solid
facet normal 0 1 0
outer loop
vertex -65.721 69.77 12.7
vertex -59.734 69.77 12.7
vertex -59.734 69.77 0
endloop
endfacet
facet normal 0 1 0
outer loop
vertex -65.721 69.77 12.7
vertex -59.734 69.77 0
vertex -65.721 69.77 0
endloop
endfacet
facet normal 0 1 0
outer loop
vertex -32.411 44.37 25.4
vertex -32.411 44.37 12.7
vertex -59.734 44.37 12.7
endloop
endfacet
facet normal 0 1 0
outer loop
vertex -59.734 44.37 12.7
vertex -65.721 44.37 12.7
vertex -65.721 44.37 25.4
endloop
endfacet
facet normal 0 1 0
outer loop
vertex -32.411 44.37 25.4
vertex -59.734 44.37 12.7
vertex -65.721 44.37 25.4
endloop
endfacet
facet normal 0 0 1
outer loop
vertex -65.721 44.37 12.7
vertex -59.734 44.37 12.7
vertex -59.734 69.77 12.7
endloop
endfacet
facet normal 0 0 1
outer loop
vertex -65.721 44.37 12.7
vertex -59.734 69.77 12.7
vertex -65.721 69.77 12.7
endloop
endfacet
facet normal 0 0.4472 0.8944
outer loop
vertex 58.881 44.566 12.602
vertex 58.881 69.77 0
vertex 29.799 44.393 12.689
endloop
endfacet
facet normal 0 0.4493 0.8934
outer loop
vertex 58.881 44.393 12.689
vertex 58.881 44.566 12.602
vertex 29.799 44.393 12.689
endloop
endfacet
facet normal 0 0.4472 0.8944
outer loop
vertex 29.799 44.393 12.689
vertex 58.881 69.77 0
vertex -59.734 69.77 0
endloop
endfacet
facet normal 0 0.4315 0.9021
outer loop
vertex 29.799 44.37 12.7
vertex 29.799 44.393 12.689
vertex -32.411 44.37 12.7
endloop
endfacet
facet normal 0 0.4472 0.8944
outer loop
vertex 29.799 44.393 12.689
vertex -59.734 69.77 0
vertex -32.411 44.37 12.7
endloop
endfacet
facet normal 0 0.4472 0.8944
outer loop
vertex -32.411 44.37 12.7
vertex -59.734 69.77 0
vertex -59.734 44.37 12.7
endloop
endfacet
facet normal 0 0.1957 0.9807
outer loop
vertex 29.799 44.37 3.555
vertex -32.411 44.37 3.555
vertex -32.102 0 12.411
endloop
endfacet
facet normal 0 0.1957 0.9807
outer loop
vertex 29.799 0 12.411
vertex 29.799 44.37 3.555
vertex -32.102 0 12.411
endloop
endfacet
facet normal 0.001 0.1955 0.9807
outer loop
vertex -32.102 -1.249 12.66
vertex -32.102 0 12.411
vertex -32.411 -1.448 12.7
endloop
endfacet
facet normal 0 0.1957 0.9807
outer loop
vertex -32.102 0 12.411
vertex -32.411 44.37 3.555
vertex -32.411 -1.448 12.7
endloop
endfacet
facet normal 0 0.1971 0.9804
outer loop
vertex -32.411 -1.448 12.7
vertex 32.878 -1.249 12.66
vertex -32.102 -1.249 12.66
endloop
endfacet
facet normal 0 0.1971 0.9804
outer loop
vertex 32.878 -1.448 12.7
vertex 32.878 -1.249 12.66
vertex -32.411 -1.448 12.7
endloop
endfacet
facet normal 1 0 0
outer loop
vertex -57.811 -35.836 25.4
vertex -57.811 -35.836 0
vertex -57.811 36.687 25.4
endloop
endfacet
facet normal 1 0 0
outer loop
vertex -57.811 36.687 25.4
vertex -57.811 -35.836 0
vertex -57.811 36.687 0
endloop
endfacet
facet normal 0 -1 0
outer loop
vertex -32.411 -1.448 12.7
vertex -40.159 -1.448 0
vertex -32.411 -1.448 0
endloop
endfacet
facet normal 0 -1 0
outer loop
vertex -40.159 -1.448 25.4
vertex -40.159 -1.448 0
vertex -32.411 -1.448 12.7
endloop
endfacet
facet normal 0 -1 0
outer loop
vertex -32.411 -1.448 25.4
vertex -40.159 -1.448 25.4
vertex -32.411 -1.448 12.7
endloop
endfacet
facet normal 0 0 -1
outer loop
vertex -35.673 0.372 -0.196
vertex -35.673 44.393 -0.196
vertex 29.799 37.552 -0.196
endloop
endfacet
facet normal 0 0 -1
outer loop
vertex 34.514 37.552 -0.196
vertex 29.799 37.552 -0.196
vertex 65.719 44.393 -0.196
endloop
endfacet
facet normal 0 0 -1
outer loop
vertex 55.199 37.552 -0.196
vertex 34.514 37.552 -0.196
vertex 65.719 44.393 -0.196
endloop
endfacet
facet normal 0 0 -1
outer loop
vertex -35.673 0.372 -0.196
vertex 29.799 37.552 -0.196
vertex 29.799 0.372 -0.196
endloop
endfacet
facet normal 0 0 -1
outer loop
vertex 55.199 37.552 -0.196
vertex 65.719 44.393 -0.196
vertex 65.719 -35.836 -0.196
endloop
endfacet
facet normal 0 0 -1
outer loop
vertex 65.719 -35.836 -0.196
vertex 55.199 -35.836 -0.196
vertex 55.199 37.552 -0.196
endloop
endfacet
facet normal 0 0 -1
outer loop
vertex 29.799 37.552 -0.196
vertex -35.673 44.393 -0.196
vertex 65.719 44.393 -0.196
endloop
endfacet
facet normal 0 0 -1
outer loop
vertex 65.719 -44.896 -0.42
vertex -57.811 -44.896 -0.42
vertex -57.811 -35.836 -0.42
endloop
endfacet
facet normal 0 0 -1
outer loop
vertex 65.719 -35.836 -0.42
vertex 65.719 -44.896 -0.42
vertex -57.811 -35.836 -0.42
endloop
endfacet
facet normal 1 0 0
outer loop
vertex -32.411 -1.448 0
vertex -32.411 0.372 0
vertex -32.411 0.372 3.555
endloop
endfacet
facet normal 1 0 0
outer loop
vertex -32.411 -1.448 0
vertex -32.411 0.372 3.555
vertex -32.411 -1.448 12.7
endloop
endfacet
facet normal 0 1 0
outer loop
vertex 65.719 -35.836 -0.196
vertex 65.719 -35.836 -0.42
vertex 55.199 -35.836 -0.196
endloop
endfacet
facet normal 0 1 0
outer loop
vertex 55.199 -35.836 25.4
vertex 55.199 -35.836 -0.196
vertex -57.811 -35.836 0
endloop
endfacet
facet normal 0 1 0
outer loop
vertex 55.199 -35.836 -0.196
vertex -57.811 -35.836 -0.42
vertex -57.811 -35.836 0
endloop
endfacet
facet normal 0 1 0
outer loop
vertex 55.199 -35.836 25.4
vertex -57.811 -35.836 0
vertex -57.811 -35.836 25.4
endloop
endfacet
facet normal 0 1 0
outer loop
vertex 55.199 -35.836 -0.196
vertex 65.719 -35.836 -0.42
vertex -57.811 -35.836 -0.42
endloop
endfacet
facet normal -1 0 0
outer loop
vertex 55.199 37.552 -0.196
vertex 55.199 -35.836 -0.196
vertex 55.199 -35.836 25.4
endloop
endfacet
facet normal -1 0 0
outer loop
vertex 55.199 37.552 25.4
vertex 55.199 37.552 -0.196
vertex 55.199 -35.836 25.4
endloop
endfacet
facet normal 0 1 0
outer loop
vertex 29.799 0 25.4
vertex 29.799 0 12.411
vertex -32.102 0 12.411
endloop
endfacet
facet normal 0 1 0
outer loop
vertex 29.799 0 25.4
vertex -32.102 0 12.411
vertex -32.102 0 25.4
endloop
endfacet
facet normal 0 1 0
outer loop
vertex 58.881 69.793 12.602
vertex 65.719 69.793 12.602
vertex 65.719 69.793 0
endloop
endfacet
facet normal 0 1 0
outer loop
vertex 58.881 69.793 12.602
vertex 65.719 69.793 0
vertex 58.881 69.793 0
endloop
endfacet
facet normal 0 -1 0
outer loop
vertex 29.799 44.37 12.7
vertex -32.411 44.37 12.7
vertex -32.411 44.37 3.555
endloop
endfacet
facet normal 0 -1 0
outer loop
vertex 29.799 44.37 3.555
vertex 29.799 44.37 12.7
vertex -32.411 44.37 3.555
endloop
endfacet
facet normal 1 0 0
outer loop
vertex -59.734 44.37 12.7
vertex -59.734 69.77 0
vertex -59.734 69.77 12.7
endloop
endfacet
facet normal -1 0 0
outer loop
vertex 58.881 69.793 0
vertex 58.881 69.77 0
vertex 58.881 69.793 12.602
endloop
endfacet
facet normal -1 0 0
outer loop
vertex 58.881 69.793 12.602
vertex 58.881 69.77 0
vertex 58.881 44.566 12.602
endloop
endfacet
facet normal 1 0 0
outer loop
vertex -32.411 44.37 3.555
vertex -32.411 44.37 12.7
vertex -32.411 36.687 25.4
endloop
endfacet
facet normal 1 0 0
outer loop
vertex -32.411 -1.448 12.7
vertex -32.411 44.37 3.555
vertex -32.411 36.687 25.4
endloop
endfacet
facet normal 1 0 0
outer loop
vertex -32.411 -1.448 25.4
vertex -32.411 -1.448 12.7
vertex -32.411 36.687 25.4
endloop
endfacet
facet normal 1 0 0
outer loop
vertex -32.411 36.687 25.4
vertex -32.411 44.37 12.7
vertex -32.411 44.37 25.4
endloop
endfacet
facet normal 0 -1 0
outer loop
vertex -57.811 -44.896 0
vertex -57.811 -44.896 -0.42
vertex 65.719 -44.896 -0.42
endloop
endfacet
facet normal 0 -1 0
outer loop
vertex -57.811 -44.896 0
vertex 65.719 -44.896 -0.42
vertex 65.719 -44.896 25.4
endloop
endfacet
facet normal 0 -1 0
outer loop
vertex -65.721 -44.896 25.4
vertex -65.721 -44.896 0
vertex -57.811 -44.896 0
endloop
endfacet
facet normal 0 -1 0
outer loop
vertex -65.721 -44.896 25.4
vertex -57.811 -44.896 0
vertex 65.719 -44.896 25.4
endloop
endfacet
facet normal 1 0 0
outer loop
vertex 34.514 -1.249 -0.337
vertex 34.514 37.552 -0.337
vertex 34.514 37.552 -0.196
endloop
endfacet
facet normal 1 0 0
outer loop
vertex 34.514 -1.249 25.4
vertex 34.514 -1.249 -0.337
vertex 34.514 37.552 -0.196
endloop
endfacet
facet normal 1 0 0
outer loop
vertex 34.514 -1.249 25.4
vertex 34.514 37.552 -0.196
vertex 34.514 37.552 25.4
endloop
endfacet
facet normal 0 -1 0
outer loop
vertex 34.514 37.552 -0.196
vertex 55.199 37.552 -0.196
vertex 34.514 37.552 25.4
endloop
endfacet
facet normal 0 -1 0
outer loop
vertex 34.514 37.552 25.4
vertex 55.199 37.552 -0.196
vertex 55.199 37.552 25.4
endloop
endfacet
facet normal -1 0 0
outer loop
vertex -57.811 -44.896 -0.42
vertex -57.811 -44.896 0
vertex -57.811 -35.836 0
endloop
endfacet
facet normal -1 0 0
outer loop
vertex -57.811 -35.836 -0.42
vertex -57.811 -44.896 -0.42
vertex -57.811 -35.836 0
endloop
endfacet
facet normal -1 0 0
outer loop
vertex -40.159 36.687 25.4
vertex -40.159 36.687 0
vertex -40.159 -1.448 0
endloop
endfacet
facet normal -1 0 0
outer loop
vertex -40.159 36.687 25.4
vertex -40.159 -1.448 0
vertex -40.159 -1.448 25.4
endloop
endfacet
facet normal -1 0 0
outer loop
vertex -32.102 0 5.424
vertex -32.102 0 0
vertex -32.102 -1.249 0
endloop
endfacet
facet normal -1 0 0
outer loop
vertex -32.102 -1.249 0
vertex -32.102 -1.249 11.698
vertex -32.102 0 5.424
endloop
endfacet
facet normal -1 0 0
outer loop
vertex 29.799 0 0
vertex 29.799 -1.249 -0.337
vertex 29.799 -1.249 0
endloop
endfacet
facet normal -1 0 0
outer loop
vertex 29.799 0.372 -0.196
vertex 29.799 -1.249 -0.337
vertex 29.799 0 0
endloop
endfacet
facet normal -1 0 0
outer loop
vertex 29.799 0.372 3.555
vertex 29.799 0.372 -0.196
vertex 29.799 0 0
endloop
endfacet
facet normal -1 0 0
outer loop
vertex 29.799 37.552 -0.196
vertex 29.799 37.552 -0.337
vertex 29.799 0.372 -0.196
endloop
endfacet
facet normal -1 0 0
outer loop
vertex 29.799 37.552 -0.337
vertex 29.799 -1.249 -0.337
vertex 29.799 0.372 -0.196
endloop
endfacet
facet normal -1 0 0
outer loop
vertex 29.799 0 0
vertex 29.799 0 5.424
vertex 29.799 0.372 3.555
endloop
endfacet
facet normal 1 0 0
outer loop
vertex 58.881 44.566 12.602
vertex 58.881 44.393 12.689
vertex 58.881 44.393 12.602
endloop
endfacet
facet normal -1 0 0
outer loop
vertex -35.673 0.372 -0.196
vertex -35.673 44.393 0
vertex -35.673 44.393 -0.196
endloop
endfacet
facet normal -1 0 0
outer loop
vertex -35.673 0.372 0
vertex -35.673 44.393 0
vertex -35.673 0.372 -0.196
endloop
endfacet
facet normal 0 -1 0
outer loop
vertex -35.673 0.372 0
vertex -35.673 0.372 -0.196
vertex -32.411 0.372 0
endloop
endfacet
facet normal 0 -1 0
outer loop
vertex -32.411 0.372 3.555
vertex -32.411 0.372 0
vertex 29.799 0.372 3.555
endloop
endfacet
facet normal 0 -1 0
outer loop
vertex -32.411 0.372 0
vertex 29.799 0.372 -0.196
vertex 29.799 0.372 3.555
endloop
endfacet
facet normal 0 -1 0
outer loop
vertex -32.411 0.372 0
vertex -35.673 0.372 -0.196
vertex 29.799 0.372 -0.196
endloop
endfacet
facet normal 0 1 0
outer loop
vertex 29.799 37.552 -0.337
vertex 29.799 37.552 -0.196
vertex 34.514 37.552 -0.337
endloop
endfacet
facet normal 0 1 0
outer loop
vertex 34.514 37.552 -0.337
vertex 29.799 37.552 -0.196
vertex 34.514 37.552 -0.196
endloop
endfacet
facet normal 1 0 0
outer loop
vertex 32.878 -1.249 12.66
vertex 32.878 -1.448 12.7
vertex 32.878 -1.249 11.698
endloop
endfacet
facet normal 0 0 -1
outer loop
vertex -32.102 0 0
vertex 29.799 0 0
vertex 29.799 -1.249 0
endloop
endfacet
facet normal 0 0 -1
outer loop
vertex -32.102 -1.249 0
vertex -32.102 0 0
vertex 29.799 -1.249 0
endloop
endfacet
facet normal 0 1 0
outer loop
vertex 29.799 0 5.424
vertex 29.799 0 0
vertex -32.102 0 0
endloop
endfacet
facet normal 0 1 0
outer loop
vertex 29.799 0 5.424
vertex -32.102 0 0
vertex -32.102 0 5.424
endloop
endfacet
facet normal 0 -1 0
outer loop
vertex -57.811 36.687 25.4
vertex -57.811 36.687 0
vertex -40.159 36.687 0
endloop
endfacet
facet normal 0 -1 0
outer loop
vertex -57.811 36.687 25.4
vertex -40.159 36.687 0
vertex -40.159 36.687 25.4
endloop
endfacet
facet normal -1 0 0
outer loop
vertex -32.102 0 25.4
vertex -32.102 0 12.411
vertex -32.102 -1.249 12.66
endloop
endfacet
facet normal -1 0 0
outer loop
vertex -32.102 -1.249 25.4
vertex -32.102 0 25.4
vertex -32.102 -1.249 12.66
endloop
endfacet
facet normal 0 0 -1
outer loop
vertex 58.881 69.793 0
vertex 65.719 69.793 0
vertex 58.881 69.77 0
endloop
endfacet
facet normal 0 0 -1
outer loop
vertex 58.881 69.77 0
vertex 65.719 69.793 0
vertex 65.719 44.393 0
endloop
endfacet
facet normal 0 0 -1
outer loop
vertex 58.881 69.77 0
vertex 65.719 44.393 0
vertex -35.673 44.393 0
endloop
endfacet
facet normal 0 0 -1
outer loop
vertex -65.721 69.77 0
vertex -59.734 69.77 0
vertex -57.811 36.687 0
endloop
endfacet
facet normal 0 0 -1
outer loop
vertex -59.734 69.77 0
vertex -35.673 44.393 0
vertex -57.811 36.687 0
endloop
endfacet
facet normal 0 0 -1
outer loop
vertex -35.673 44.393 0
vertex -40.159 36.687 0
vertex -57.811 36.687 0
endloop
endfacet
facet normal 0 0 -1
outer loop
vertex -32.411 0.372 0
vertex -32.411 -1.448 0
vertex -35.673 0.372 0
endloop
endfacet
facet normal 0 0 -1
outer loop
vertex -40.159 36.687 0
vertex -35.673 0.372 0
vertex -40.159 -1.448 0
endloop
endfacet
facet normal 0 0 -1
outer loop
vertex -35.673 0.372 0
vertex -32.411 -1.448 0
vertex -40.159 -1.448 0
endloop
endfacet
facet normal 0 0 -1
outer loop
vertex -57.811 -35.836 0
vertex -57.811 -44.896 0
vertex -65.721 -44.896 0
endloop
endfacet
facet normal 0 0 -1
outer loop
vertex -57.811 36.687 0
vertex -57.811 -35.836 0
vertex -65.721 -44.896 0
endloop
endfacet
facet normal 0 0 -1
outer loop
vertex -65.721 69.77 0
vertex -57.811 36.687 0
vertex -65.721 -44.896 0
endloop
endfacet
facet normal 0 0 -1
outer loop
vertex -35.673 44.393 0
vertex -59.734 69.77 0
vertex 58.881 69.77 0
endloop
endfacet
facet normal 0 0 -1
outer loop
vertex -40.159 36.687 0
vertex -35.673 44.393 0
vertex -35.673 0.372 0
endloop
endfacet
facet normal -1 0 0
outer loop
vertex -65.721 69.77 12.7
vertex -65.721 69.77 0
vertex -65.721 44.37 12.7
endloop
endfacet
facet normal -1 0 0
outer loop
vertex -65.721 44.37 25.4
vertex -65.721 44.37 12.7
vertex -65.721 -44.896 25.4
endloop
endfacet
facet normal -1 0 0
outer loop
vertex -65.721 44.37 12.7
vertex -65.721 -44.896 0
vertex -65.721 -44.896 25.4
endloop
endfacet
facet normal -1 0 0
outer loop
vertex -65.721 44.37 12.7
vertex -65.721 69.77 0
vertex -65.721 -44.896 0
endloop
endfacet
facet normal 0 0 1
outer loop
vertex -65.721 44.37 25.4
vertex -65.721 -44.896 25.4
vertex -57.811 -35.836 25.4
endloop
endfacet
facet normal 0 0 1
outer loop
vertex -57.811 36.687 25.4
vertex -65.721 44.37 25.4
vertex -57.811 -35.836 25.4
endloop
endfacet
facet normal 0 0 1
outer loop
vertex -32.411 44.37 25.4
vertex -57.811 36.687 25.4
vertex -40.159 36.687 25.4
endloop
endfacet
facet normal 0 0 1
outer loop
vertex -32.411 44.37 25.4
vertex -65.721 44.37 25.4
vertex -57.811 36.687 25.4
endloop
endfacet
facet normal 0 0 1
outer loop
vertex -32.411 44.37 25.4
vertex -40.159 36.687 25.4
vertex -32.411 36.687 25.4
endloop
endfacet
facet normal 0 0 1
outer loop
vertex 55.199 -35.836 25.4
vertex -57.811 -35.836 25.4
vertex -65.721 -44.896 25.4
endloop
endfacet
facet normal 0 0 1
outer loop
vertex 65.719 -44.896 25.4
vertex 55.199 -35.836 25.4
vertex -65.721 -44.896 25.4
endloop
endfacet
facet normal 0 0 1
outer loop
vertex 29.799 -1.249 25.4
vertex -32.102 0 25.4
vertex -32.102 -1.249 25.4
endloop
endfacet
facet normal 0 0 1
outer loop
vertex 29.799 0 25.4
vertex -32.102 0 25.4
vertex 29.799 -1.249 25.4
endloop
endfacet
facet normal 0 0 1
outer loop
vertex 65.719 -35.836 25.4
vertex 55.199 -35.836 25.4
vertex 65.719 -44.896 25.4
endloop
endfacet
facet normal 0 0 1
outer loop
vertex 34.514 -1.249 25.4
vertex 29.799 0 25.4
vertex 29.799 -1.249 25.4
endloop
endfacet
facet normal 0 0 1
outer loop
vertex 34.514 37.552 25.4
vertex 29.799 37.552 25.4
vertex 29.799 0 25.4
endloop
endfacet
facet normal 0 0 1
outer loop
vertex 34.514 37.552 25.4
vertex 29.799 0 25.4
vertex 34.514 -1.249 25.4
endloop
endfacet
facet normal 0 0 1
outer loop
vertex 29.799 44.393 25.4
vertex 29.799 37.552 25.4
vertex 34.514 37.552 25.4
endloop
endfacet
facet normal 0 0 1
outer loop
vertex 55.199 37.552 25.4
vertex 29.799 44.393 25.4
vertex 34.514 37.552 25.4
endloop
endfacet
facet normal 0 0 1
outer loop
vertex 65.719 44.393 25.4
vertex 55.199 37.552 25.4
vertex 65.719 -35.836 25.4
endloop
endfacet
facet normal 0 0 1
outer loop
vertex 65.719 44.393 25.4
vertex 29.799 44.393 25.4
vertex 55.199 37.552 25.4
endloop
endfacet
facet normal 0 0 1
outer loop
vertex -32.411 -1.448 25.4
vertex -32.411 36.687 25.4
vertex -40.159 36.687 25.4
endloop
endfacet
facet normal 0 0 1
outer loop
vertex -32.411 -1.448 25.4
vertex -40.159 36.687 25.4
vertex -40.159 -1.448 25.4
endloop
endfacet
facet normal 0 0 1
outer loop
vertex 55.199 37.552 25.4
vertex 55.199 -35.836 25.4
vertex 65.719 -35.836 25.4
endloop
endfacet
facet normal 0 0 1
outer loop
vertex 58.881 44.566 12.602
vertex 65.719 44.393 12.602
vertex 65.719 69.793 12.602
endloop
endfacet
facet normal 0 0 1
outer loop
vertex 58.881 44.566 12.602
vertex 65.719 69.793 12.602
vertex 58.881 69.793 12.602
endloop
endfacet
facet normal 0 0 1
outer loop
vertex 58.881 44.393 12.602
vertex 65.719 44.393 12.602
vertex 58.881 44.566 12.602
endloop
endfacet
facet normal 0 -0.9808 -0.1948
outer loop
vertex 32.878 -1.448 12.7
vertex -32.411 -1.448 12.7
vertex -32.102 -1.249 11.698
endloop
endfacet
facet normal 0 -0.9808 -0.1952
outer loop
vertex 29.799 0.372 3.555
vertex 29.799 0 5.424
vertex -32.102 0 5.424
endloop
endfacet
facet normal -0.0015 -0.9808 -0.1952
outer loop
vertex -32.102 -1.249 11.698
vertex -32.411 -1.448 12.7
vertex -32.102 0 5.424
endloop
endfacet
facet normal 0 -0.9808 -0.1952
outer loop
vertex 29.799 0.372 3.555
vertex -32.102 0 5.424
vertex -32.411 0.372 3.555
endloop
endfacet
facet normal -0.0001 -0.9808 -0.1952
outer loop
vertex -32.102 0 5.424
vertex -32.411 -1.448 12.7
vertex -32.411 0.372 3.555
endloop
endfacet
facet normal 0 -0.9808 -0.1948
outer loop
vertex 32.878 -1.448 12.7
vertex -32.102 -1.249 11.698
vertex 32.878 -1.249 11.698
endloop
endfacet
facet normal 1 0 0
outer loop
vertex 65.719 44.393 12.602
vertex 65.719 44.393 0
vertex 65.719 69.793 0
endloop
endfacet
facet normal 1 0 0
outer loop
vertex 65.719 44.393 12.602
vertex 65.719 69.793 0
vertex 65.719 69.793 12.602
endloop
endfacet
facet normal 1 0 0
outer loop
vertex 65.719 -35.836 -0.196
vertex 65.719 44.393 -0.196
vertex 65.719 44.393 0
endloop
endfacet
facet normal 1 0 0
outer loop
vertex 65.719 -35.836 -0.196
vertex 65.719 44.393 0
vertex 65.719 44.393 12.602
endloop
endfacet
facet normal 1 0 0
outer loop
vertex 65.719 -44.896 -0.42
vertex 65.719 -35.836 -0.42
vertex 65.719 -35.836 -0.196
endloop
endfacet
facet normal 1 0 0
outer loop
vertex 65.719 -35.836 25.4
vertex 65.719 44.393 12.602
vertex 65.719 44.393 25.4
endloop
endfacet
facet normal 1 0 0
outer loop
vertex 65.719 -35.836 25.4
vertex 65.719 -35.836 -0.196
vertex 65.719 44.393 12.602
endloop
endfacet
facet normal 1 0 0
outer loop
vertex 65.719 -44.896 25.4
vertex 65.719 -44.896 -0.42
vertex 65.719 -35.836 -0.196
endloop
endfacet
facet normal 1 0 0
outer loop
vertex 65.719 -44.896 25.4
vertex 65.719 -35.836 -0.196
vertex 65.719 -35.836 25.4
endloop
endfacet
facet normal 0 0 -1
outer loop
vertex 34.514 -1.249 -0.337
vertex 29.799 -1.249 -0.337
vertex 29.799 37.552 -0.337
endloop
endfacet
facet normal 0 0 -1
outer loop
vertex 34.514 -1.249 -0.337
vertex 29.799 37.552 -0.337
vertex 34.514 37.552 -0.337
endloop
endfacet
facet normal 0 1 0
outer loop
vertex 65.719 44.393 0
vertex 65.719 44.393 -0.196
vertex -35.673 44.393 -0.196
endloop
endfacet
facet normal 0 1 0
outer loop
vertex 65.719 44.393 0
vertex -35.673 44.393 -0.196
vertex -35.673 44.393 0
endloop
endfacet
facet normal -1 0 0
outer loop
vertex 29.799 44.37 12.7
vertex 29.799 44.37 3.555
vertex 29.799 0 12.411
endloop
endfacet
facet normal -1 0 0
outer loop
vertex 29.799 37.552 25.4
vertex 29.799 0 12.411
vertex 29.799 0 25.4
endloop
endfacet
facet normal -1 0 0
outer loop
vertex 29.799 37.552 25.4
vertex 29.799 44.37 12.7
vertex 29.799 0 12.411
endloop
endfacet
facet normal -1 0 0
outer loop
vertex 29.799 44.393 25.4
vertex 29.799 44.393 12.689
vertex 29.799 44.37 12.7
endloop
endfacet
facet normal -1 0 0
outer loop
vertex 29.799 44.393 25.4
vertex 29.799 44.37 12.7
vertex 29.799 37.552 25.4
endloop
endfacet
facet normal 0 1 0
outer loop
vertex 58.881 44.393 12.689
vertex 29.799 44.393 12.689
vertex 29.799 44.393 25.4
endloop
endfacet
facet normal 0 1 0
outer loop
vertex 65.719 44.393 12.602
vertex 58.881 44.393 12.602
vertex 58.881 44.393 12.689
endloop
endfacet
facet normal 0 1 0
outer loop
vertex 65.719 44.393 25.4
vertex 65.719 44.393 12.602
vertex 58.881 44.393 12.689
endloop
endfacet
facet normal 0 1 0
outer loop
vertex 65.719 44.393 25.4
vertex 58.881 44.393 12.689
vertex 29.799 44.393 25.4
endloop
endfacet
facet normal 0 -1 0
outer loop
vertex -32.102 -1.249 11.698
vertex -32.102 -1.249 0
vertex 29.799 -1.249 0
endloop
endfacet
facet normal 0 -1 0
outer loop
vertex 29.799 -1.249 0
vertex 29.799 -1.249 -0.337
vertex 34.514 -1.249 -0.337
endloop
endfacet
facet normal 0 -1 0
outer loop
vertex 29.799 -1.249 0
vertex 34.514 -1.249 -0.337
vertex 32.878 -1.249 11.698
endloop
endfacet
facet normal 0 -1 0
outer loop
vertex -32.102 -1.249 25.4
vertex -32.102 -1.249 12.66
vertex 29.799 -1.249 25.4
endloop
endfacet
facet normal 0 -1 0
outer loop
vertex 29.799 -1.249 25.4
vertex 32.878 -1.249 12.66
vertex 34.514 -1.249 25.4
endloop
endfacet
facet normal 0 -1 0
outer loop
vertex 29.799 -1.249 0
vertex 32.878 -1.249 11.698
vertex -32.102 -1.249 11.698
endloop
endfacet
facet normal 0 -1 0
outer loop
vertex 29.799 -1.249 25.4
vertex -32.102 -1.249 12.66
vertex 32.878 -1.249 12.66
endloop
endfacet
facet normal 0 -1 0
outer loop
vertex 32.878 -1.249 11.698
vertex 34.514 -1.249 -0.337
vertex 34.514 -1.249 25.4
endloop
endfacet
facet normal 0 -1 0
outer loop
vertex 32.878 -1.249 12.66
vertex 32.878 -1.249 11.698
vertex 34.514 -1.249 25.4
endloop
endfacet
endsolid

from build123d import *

# Parameters (mm, degrees)
F0_W      = 7.9096108675
F0_H      = 89.265525341
F1_DEPTH  = 25.4
F2_W      = 9.0597718954
F2_H      = 25.8198998213
F3_DEPTH  = 123.5302612185
F4_W      = 10.519862175
F4_H      = 25.5959949732
F5_DEPTH  = 80.2284926176
F6_W      = 6.8411193788
F6_H      = 25.5959949732
F7_DEPTH  = 25.4
F8_W      = 7.6834112406
F8_H      = 25.4
F9_DEPTH  = 25.4
F10_W     = 4.7150052428
F10_H     = 25.7374218941
F11_DEPTH = 38.8002488762
F12_W     = 1.2486185879
F12_H     = 25.4
F13_DEPTH = 61.9014054537
F14_W     = 7.7484271765
F14_H     = 25.4
F15_DEPTH = 38.1346493959
F16_W     = 44.0207533538
F16_H     = 3.7513971329
F17_DEPTH = 65.4726680368
F19_DEPTH = 65.2894191444
F20_W     = 5.9870034456
F20_H     = 12.7
F21_DEPTH = 25.4
F23_DEPTH = 118.6141502112
F24_W     = 6.8387184292
F24_H     = 12.6020025134
F25_DEPTH = 25.4


with BuildPart() as f1:
    # F0 (on Top) → F1 (new body)
    with BuildSketch(Plane.XY):
        with Locations((-61.7658346891, -0.2627521753)):
            Rectangle(F0_W, F0_H)
    extrude(amount=F1_DEPTH)

    # F2 (on face) → F3 (join)
    with BuildSketch(Plane.YZ.offset(-57.8110292554)):
        with Locations((-40.3656288981, 12.4900500894)):
            Rectangle(F2_W, F2_H)
    extrude(amount=F3_DEPTH)

    # F4 (on face) → F5 (join)
    with BuildSketch(Plane(origin=(0, -35.8357429504, 0), x_dir=(-1, 0, 0), z_dir=(0, 1, 0))):
        with Locations((-60.4593008757, 12.6020025134)):
            Rectangle(F4_W, F4_H)
    extrude(amount=F5_DEPTH)

    # F6 (on face) → F7 (join)
    with BuildSketch(Plane(origin=(55.1993697882, 0, 0), x_dir=(0, -1, 0), z_dir=(-1, 0, 0))):
        with Locations((-40.9721899778, 12.6020025134)):
            Rectangle(F6_W, F6_H)
    extrude(amount=F7_DEPTH)

    # F8 (on face) → F9 (join)
    with BuildSketch(Plane.YZ.offset(-57.8110292554)):
        with Locations((40.5283048749, 12.7)):
            Rectangle(F8_W, F8_H)
    extrude(amount=F9_DEPTH)

    # F10 (on face) → F11 (join)
    with BuildSketch(Plane.XZ.offset(-37.5516302884)):
        with Locations((32.1568724096, 12.531289053)):
            Rectangle(F10_W, F10_H)
    extrude(amount=F11_DEPTH)

    # F12 (on face) → F13 (join)
    with BuildSketch(Plane(origin=(29.7993697882, 0, 0), x_dir=(0, -1, 0), z_dir=(-1, 0, 0))):
        with Locations((0.6243092939, 12.7)):
            Rectangle(F12_W, F12_H)
    extrude(amount=F13_DEPTH)

    # F14 (on face) → F15 (join)
    with BuildSketch(Plane.XZ.offset(-36.6865992546)):
        with Locations((-36.2852428436, 12.7)):
            Rectangle(F14_W, F14_H)
    extrude(amount=F15_DEPTH)

    # F16 (on face) → F17 (join)
    with BuildSketch(Plane(origin=(29.7993697882, 0, 0), x_dir=(0, -1, 0), z_dir=(-1, 0, 0))):
        with Locations((-22.3823729903, 1.6797035933)):
            Rectangle(F16_W, F16_H)
    extrude(amount=F17_DEPTH)

    # F18 (on face) → F19 (join)
    with BuildSketch(Plane.YZ.offset(-32.4110292554)):
        Polygon((44.3700104952, 3.5554021597), (-1.4480501413, 12.7), (0.3719963133, 3.5554021597), align=None)
    extrude(amount=F19_DEPTH)

    # F20 (on face) → F21 (join)
    with BuildSketch(Plane(origin=(0, 44.3700104952, 0), x_dir=(-1, 0, 0), z_dir=(0, 1, 0))):
        with Locations((62.7271384001, 6.35)):
            Rectangle(F20_W, F20_H)
    extrude(amount=F21_DEPTH)

    # F22 (on face) → F23 (join)
    with BuildSketch(Plane.YZ.offset(-59.7336366773)):
        Polygon((69.7700104952, 0), (44.3700104952, 12.7), (44.3700104952, 0), align=None)
    extrude(amount=F23_DEPTH)

    # F24 (on face) → F25 (join)
    with BuildSketch(Plane(origin=(0, 44.3927496672, 0), x_dir=(-1, 0, 0), z_dir=(0, 1, 0))):
        with Locations((-62.2998727486, 6.3010012567)):
            Rectangle(F24_W, F24_H)
    extrude(amount=F25_DEPTH)


solid = f1.part
